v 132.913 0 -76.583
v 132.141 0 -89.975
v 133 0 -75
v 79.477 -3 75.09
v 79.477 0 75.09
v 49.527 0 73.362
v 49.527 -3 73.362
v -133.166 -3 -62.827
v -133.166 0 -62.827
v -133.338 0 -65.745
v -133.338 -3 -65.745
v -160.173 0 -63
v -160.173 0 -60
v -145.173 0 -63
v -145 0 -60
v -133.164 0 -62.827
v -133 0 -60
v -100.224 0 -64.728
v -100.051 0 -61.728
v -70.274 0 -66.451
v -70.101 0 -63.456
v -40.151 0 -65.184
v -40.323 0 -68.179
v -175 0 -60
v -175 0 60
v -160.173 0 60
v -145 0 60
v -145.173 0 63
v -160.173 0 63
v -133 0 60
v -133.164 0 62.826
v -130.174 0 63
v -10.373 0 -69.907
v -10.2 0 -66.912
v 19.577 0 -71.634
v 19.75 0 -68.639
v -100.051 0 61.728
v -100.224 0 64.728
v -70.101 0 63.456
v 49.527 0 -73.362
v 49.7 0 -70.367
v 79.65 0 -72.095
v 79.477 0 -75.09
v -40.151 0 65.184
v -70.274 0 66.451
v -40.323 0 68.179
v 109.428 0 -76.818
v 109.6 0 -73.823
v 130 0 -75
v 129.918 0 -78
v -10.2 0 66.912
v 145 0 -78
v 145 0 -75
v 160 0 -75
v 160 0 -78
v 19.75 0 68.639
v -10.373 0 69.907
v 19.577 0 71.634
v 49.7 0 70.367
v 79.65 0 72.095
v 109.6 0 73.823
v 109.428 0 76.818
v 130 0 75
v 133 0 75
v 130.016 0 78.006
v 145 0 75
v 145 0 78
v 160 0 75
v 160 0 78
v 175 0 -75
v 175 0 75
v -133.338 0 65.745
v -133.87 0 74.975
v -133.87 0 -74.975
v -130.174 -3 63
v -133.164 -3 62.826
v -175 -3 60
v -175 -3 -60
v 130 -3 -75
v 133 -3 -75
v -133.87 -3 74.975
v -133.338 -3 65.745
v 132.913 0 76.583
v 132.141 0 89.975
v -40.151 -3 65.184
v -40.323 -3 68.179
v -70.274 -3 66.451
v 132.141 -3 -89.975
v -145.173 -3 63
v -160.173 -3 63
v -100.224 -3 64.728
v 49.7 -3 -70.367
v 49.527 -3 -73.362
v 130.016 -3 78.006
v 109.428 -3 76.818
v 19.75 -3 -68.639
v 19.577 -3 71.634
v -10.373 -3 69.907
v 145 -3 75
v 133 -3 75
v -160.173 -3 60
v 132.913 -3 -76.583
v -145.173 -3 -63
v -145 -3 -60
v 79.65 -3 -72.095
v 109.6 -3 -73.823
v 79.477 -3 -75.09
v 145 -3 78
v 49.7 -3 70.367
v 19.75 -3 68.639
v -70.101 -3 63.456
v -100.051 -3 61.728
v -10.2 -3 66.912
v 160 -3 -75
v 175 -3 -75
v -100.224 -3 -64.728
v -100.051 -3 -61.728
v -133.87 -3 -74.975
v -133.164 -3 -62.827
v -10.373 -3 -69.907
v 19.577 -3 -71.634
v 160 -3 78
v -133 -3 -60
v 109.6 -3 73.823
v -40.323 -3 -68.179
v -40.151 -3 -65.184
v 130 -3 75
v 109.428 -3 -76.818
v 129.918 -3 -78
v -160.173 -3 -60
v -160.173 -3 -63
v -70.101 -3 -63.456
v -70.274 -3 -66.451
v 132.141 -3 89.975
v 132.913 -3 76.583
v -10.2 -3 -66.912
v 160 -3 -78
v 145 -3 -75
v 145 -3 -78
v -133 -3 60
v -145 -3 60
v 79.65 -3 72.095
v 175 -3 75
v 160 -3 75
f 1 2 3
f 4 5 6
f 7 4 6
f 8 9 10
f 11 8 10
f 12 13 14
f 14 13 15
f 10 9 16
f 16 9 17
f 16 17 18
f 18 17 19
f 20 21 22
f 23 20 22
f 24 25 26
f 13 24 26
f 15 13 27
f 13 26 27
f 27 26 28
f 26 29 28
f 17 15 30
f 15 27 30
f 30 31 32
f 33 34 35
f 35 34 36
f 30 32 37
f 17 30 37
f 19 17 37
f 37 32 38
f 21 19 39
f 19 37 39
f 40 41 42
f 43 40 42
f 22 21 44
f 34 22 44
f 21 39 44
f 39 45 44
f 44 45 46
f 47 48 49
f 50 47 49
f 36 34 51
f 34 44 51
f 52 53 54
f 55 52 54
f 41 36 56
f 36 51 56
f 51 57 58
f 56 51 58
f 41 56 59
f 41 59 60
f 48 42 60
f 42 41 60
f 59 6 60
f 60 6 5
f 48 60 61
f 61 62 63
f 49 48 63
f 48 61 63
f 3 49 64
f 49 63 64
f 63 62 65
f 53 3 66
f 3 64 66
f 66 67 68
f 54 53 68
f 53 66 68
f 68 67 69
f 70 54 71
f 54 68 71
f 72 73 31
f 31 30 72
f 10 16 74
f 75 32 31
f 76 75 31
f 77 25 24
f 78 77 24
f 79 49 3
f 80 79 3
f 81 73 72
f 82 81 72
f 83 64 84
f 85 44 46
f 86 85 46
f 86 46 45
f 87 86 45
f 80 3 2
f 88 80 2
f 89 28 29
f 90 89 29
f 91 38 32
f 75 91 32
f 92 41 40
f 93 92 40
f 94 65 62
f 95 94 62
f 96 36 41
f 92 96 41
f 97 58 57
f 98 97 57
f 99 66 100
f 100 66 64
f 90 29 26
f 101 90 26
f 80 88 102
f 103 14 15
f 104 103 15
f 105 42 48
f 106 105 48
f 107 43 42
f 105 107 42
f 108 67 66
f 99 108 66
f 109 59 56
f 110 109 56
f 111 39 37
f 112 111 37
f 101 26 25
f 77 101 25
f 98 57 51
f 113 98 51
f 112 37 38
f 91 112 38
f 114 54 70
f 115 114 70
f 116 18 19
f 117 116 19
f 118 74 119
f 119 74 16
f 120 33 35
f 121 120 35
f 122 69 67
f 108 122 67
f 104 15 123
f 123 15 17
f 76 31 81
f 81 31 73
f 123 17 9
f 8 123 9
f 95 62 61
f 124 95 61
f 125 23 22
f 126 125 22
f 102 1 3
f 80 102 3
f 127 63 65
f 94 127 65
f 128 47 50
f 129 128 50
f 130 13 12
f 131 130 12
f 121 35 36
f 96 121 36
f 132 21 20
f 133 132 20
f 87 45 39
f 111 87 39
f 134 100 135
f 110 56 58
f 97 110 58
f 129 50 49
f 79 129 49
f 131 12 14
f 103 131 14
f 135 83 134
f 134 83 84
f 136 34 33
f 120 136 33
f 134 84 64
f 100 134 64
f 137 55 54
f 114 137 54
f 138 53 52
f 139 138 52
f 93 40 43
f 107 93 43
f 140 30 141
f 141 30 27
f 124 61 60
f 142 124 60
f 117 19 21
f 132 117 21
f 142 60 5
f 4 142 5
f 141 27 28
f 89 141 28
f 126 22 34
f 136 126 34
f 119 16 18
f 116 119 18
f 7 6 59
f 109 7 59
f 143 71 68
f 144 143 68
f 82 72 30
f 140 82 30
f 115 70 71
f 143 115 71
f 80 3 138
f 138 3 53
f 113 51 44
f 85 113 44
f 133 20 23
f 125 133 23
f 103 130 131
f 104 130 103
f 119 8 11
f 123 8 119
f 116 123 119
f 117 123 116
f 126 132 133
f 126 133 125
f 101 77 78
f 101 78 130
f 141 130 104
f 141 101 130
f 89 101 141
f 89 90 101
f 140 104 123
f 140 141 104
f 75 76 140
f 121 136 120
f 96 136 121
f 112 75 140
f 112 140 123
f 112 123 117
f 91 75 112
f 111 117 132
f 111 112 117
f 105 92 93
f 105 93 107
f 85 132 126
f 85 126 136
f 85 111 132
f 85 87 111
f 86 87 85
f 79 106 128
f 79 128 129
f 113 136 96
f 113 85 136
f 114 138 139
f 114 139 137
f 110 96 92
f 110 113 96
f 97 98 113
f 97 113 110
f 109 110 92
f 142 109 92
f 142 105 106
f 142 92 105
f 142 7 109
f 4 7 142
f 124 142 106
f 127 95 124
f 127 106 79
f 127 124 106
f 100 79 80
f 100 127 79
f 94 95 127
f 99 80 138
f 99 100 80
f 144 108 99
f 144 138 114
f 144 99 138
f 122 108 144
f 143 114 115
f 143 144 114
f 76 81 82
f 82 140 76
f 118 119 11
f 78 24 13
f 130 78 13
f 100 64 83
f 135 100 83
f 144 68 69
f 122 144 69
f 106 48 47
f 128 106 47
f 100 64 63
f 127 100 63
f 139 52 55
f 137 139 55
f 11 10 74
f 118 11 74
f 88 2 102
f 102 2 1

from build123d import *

# Parameters (mm, degrees)
F1_DEPTH = 3


with BuildPart() as f1:
    # F0 (on Front) → F1 (new body)
    with BuildSketch(Plane.XZ):
        Polygon((-100.051005, 61.727827), (-100.224086, 64.727896), (-130.174284, 63), (-133.164225, 62.8263), (-133, 60), (-130, 60), (-130, 30), (-133, 30), (-133, 0), (-133, -30), (-130, -30), (-130, -60), (-133, -60), (-133.164295, -62.827499), (-100.224086, -64.727896), (-100.051005, -61.727827), (-70.100807, -63.455723), (-70.273596, -66.450743), (-40.323398, -68.178639), (-40.150609, -65.183619), (-10.20041, -66.911515), (-10.3732, -69.906535), (19.576998, -71.634431), (19.749788, -68.639411), (49.699986, -70.367307), (49.527197, -73.362327), (79.477395, -75.090223), (79.650184, -72.095203), (109.600383, -73.823099), (109.427593, -76.818119), (129.918192, -78.000269), (130, -75), (133, -75), (133, -60), (130, -60), (130, -30), (133, -30), (133, 0), (133, 30), (130, 30), (130, 60), (133, 60), (133, 75), (130, 75), (130.015937, 78.005908), (109.427593, 76.818119), (109.600383, 73.823099), (79.650184, 72.095203), (79.477395, 75.090223), (49.527197, 73.362327), (49.699986, 70.367307), (19.749788, 68.639411), (19.576998, 71.634431), (-10.3732, 69.906535), (-10.20041, 66.911515), (-40.150609, 65.183619), (-40.323398, 68.178639), (-70.273596, 66.450743), (-70.100807, 63.455723), align=None)
        Polygon((132.140548, 89.975358), (133, 75), (132.913212, 76.582515), align=None)
        Polygon((132.913212, -76.582515), (133, -75), (132.140548, -89.975358), align=None)
        Polygon((-133, 60), (-133.164225, 62.8263), (-133.870123, 74.974742), (-133.337656, 65.745315), align=None)
        Polygon((-130, 60), (-133, 60), (-145, 60), (-145.173077, 63), (-160.173077, 63), (-160.173077, 60), (-175, 60), (-175, 0), (-175, -60), (-160.173077, -60), (-160.173077, -63), (-145.173077, -63), (-145, -60), (-133, -60), (-130, -60), (-130, -30), (-133, -30), (-133, 0), (-133, 30), (-130, 30), align=None)
        Polygon((-133.164295, -62.827499), (-133, -60), (-133.166168, -62.827391), align=None)
        Polygon((-133.164295, -62.827499), (-133.166168, -62.827391), (-133.337656, -65.745315), (-133.870123, -74.974742), align=None)
        Polygon((145, 75), (133, 75), (133, 60), (130, 60), (130, 30), (133, 30), (133, 0), (133, -30), (130, -30), (130, -60), (133, -60), (133, -75), (145, -75), (145, -78), (160, -78), (160, -75), (175, -75), (175, 0), (175, 75), (160, 75), (160, 78), (145, 78), align=None)
    extrude(amount=F1_DEPTH)


solid = f1.part
